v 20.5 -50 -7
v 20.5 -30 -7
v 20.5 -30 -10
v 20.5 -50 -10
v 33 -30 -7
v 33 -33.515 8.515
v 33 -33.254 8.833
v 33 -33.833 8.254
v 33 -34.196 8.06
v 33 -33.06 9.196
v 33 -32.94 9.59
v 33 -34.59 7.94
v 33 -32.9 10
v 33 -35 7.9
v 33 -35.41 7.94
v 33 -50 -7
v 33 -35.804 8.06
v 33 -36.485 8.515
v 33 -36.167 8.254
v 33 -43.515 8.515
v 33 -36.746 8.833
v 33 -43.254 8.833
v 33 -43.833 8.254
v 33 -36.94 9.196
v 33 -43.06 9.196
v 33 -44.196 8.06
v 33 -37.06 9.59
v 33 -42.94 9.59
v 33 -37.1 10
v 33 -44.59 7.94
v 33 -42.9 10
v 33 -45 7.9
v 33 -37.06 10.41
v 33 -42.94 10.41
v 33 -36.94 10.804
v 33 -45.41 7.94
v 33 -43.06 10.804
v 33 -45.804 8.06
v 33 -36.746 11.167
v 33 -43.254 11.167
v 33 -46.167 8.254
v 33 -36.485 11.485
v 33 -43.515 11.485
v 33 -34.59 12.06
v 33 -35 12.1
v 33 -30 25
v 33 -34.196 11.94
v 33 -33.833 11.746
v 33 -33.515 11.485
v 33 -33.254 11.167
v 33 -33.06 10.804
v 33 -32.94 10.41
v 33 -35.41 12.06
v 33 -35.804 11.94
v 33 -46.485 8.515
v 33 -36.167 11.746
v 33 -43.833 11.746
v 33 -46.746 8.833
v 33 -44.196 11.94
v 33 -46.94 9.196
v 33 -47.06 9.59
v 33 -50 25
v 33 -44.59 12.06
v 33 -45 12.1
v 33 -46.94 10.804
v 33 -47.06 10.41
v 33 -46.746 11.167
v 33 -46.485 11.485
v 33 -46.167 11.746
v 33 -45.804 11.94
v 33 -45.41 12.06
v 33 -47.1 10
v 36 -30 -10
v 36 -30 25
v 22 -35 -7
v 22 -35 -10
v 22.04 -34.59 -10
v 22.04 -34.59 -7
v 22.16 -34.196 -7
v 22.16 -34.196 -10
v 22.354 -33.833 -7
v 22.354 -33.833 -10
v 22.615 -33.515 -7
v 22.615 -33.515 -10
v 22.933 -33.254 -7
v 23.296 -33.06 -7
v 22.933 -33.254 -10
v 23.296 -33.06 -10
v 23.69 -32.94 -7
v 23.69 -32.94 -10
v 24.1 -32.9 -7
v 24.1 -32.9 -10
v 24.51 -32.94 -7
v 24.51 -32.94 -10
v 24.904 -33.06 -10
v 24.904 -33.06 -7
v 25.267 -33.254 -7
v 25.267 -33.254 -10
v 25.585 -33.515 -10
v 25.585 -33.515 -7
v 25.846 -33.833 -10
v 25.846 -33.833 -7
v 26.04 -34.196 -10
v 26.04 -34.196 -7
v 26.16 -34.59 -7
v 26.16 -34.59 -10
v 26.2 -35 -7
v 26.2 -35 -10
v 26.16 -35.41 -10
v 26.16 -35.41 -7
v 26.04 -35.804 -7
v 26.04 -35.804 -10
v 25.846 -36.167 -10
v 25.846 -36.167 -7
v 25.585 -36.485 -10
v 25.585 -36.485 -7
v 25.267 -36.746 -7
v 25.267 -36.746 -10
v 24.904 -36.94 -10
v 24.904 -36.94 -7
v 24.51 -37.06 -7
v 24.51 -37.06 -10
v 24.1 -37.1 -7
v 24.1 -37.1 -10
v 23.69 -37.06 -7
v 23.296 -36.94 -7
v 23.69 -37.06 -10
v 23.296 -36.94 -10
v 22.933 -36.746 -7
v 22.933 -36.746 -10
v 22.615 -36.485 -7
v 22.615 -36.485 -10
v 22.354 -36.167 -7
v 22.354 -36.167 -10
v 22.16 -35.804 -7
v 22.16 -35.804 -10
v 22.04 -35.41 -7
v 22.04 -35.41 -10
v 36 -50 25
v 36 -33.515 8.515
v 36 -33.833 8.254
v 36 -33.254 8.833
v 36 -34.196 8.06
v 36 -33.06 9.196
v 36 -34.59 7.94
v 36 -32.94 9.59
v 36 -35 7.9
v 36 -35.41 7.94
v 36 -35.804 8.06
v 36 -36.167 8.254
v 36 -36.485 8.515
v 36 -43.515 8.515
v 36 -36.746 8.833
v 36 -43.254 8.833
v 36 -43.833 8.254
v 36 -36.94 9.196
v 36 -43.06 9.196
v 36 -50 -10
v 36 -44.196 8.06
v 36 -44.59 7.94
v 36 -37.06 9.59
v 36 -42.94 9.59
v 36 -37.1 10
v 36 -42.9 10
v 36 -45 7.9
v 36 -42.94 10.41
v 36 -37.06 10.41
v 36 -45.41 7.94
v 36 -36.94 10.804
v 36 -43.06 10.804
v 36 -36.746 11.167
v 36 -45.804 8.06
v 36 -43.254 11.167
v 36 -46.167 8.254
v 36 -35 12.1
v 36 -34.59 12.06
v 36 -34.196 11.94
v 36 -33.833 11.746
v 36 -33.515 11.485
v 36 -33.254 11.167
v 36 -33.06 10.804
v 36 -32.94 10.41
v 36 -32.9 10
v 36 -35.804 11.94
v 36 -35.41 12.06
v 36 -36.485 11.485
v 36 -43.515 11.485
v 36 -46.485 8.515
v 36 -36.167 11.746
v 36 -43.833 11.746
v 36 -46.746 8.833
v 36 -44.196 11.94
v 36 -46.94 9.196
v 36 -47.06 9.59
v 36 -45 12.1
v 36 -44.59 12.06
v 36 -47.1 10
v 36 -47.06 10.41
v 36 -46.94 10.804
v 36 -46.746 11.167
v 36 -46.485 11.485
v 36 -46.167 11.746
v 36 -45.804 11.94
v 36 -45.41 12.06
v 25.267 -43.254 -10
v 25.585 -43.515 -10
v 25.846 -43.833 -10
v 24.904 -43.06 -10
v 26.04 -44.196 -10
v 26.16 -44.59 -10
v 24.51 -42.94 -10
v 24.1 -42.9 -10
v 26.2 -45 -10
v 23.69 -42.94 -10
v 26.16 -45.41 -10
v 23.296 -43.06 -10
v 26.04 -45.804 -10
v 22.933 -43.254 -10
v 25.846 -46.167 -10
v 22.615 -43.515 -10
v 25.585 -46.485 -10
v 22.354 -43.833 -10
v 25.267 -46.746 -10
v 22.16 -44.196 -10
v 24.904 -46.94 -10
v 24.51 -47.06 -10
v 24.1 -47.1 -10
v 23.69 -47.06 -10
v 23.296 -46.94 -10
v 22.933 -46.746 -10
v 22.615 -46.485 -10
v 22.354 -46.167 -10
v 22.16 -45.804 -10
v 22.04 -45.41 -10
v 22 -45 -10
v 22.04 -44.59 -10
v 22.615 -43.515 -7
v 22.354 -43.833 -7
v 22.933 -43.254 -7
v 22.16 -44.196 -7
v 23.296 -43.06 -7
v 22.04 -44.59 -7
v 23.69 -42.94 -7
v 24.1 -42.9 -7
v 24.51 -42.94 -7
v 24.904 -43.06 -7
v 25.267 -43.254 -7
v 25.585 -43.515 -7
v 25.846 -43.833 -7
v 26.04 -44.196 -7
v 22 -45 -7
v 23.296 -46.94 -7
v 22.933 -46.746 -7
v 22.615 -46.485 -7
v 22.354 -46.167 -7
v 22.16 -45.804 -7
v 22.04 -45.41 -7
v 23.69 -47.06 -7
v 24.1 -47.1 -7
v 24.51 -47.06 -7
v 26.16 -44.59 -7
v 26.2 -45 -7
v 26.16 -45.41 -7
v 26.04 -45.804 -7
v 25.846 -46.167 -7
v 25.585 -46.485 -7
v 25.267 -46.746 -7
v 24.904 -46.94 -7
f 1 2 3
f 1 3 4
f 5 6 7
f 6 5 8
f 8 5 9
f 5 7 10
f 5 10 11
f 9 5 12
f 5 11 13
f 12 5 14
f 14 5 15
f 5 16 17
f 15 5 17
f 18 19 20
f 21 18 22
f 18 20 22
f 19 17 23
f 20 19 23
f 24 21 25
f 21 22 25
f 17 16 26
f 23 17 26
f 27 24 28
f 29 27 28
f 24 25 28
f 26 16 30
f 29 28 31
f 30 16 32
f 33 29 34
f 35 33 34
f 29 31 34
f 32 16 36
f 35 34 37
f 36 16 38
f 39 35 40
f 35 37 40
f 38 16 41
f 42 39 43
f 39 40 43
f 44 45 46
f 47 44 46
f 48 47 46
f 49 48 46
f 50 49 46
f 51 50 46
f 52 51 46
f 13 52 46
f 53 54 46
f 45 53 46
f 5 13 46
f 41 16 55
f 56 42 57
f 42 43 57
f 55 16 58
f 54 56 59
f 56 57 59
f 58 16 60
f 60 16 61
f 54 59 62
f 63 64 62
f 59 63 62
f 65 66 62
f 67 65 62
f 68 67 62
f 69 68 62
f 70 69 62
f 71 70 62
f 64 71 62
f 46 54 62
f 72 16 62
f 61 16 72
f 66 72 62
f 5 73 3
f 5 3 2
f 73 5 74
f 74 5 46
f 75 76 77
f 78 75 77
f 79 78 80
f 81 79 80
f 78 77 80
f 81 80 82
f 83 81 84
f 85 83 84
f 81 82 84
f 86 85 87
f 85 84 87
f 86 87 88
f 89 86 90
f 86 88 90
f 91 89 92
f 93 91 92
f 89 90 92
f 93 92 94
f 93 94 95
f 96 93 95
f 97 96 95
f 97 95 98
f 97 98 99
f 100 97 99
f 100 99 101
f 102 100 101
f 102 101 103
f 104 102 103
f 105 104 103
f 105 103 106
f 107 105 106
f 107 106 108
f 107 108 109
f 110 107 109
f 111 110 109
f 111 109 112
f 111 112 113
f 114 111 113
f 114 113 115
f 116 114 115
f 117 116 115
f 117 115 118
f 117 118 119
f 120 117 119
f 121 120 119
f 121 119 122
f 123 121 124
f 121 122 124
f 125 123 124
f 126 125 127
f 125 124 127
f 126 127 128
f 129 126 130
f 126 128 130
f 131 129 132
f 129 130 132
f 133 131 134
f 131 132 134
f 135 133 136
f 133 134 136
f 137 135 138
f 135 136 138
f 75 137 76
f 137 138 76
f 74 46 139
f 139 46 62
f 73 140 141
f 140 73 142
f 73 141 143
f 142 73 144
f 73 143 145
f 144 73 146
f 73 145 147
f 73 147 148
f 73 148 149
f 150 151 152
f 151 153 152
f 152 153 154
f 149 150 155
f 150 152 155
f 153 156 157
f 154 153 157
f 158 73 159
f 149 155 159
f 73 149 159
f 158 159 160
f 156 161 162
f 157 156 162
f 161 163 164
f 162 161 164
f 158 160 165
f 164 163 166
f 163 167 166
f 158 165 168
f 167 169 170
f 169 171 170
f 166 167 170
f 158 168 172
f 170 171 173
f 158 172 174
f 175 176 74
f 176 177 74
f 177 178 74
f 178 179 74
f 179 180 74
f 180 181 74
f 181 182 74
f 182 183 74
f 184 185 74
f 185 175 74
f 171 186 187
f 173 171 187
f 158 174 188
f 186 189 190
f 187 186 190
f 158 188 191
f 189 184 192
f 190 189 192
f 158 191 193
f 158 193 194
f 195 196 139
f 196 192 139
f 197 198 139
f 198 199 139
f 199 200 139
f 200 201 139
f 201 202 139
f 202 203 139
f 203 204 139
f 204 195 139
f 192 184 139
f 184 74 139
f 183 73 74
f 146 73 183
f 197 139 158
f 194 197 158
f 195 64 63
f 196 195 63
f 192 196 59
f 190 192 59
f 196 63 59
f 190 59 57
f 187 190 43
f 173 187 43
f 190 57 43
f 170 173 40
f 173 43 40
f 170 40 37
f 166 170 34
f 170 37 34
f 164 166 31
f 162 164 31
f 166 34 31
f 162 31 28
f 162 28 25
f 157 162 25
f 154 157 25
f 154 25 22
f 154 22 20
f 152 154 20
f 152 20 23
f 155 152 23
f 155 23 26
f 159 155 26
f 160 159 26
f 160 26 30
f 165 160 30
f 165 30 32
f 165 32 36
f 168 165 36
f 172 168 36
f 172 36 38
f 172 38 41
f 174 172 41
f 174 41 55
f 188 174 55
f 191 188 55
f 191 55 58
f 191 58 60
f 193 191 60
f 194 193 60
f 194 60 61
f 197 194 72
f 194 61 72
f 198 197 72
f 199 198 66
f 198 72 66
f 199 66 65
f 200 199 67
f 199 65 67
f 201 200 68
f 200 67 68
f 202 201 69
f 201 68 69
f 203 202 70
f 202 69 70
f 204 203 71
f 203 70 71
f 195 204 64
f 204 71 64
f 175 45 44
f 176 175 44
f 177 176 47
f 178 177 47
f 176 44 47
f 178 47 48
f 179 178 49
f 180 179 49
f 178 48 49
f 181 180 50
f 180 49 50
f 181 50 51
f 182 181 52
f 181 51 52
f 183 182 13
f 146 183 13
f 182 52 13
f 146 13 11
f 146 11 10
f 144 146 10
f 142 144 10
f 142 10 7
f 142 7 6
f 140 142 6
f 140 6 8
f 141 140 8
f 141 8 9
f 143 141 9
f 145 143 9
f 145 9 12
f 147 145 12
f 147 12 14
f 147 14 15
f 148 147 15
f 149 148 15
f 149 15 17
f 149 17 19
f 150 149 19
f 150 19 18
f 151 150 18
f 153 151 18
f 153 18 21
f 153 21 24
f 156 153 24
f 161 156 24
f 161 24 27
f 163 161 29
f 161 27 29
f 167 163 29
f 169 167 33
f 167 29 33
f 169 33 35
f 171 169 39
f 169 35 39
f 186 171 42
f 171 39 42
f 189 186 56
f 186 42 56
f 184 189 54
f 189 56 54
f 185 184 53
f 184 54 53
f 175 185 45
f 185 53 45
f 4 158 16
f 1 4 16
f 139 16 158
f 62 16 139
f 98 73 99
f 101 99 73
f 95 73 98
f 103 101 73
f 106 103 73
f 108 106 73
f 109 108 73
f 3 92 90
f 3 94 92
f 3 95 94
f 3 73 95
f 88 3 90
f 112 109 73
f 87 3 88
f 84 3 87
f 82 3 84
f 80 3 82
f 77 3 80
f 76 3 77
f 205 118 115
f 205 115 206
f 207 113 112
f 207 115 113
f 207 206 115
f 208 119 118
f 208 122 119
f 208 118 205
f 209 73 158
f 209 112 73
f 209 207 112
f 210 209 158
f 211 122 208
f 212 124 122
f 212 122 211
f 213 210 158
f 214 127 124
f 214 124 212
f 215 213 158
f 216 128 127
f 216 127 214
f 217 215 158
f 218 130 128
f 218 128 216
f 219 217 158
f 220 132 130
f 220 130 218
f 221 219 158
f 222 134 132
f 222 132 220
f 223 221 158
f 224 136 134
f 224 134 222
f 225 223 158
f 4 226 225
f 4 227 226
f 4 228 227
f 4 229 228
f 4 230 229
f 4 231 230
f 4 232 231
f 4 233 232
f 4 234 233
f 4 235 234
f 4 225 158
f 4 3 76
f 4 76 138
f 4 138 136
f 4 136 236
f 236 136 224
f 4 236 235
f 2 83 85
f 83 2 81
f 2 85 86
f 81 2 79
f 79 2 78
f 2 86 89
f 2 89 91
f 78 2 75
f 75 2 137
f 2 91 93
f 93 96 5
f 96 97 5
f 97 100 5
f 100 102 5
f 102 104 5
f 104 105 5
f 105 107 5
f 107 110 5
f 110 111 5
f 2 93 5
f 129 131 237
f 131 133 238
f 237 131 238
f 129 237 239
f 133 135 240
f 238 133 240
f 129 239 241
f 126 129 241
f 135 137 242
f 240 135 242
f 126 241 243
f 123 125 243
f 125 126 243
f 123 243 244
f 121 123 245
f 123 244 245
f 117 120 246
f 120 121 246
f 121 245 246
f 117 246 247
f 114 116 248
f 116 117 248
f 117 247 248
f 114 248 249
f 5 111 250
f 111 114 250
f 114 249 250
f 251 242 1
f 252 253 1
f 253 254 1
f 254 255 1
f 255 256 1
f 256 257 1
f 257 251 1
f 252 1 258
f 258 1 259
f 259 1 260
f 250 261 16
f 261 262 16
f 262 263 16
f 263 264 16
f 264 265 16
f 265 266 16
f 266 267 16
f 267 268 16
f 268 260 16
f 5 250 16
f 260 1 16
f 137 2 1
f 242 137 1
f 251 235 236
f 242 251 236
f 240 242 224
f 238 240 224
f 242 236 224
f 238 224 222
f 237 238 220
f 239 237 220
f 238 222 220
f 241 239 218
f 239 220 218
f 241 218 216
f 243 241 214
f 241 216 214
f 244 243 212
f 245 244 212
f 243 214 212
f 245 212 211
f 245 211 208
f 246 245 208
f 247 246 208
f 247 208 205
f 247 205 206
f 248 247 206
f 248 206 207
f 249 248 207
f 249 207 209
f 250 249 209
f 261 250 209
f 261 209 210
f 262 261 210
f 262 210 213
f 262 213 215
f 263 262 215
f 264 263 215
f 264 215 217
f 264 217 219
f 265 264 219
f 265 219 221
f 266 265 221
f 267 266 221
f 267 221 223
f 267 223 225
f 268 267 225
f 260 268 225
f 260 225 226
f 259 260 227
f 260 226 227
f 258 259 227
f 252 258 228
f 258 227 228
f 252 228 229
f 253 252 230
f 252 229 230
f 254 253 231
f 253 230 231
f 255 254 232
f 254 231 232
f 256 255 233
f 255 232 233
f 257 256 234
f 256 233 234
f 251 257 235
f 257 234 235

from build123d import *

# Parameters (mm, degrees)
SKETCH_1_W                  = 20
SKETCH_1_H                  = 35
EXTRUDE_1_DEPTH             = 15.5
SKETCH_2_W                  = 12.5
SKETCH_2_H                  = 32
CUT_EXTRUDE_1_DEPTH         = 49.176757882
HOLE_WIZARD_4_2_4_2_1_D     = 4.2
HOLE_WIZARD_4_2_4_2_1_DEPTH = 15.5
HOLE_WIZARD_4_2_4_2_2_D     = 4.2


with BuildPart() as part:
    # 草图1 → 凸台-拉伸1 (new body)
    with BuildSketch(Plane(origin=(20.5, 0, 0), x_dir=(0, -1, 0), z_dir=(-1, 0, 0))):
        with Locations((40, 7.5)):
            Rectangle(SKETCH_1_W, SKETCH_1_H)
    extrude(amount=-EXTRUDE_1_DEPTH)

    # 草图2 → 切除-拉伸1 (cut, through all)
    with BuildSketch(Plane.XZ.offset(50)):
        with Locations((26.75, 9)):
            Rectangle(SKETCH_2_W, SKETCH_2_H)
    extrude(amount=-CUT_EXTRUDE_1_DEPTH, mode=Mode.SUBTRACT)

    # Ø4.2 (4.2) 直径孔1
    with Locations(Plane(origin=(36, 0, 0), x_dir=(0, 0, -1), z_dir=(1, 0, 0))):
        with Locations((-10, -35), (-10, -45)):
            Hole(HOLE_WIZARD_4_2_4_2_1_D / 2, depth=HOLE_WIZARD_4_2_4_2_1_DEPTH)

    # Ø4.2 (4.2) 直径孔2 (through all)
    with Locations(Plane.XY.offset(-7)):
        with Locations((24.1, -45), (24.1, -35)):
            Hole(HOLE_WIZARD_4_2_4_2_2_D / 2)


solid = part.part
